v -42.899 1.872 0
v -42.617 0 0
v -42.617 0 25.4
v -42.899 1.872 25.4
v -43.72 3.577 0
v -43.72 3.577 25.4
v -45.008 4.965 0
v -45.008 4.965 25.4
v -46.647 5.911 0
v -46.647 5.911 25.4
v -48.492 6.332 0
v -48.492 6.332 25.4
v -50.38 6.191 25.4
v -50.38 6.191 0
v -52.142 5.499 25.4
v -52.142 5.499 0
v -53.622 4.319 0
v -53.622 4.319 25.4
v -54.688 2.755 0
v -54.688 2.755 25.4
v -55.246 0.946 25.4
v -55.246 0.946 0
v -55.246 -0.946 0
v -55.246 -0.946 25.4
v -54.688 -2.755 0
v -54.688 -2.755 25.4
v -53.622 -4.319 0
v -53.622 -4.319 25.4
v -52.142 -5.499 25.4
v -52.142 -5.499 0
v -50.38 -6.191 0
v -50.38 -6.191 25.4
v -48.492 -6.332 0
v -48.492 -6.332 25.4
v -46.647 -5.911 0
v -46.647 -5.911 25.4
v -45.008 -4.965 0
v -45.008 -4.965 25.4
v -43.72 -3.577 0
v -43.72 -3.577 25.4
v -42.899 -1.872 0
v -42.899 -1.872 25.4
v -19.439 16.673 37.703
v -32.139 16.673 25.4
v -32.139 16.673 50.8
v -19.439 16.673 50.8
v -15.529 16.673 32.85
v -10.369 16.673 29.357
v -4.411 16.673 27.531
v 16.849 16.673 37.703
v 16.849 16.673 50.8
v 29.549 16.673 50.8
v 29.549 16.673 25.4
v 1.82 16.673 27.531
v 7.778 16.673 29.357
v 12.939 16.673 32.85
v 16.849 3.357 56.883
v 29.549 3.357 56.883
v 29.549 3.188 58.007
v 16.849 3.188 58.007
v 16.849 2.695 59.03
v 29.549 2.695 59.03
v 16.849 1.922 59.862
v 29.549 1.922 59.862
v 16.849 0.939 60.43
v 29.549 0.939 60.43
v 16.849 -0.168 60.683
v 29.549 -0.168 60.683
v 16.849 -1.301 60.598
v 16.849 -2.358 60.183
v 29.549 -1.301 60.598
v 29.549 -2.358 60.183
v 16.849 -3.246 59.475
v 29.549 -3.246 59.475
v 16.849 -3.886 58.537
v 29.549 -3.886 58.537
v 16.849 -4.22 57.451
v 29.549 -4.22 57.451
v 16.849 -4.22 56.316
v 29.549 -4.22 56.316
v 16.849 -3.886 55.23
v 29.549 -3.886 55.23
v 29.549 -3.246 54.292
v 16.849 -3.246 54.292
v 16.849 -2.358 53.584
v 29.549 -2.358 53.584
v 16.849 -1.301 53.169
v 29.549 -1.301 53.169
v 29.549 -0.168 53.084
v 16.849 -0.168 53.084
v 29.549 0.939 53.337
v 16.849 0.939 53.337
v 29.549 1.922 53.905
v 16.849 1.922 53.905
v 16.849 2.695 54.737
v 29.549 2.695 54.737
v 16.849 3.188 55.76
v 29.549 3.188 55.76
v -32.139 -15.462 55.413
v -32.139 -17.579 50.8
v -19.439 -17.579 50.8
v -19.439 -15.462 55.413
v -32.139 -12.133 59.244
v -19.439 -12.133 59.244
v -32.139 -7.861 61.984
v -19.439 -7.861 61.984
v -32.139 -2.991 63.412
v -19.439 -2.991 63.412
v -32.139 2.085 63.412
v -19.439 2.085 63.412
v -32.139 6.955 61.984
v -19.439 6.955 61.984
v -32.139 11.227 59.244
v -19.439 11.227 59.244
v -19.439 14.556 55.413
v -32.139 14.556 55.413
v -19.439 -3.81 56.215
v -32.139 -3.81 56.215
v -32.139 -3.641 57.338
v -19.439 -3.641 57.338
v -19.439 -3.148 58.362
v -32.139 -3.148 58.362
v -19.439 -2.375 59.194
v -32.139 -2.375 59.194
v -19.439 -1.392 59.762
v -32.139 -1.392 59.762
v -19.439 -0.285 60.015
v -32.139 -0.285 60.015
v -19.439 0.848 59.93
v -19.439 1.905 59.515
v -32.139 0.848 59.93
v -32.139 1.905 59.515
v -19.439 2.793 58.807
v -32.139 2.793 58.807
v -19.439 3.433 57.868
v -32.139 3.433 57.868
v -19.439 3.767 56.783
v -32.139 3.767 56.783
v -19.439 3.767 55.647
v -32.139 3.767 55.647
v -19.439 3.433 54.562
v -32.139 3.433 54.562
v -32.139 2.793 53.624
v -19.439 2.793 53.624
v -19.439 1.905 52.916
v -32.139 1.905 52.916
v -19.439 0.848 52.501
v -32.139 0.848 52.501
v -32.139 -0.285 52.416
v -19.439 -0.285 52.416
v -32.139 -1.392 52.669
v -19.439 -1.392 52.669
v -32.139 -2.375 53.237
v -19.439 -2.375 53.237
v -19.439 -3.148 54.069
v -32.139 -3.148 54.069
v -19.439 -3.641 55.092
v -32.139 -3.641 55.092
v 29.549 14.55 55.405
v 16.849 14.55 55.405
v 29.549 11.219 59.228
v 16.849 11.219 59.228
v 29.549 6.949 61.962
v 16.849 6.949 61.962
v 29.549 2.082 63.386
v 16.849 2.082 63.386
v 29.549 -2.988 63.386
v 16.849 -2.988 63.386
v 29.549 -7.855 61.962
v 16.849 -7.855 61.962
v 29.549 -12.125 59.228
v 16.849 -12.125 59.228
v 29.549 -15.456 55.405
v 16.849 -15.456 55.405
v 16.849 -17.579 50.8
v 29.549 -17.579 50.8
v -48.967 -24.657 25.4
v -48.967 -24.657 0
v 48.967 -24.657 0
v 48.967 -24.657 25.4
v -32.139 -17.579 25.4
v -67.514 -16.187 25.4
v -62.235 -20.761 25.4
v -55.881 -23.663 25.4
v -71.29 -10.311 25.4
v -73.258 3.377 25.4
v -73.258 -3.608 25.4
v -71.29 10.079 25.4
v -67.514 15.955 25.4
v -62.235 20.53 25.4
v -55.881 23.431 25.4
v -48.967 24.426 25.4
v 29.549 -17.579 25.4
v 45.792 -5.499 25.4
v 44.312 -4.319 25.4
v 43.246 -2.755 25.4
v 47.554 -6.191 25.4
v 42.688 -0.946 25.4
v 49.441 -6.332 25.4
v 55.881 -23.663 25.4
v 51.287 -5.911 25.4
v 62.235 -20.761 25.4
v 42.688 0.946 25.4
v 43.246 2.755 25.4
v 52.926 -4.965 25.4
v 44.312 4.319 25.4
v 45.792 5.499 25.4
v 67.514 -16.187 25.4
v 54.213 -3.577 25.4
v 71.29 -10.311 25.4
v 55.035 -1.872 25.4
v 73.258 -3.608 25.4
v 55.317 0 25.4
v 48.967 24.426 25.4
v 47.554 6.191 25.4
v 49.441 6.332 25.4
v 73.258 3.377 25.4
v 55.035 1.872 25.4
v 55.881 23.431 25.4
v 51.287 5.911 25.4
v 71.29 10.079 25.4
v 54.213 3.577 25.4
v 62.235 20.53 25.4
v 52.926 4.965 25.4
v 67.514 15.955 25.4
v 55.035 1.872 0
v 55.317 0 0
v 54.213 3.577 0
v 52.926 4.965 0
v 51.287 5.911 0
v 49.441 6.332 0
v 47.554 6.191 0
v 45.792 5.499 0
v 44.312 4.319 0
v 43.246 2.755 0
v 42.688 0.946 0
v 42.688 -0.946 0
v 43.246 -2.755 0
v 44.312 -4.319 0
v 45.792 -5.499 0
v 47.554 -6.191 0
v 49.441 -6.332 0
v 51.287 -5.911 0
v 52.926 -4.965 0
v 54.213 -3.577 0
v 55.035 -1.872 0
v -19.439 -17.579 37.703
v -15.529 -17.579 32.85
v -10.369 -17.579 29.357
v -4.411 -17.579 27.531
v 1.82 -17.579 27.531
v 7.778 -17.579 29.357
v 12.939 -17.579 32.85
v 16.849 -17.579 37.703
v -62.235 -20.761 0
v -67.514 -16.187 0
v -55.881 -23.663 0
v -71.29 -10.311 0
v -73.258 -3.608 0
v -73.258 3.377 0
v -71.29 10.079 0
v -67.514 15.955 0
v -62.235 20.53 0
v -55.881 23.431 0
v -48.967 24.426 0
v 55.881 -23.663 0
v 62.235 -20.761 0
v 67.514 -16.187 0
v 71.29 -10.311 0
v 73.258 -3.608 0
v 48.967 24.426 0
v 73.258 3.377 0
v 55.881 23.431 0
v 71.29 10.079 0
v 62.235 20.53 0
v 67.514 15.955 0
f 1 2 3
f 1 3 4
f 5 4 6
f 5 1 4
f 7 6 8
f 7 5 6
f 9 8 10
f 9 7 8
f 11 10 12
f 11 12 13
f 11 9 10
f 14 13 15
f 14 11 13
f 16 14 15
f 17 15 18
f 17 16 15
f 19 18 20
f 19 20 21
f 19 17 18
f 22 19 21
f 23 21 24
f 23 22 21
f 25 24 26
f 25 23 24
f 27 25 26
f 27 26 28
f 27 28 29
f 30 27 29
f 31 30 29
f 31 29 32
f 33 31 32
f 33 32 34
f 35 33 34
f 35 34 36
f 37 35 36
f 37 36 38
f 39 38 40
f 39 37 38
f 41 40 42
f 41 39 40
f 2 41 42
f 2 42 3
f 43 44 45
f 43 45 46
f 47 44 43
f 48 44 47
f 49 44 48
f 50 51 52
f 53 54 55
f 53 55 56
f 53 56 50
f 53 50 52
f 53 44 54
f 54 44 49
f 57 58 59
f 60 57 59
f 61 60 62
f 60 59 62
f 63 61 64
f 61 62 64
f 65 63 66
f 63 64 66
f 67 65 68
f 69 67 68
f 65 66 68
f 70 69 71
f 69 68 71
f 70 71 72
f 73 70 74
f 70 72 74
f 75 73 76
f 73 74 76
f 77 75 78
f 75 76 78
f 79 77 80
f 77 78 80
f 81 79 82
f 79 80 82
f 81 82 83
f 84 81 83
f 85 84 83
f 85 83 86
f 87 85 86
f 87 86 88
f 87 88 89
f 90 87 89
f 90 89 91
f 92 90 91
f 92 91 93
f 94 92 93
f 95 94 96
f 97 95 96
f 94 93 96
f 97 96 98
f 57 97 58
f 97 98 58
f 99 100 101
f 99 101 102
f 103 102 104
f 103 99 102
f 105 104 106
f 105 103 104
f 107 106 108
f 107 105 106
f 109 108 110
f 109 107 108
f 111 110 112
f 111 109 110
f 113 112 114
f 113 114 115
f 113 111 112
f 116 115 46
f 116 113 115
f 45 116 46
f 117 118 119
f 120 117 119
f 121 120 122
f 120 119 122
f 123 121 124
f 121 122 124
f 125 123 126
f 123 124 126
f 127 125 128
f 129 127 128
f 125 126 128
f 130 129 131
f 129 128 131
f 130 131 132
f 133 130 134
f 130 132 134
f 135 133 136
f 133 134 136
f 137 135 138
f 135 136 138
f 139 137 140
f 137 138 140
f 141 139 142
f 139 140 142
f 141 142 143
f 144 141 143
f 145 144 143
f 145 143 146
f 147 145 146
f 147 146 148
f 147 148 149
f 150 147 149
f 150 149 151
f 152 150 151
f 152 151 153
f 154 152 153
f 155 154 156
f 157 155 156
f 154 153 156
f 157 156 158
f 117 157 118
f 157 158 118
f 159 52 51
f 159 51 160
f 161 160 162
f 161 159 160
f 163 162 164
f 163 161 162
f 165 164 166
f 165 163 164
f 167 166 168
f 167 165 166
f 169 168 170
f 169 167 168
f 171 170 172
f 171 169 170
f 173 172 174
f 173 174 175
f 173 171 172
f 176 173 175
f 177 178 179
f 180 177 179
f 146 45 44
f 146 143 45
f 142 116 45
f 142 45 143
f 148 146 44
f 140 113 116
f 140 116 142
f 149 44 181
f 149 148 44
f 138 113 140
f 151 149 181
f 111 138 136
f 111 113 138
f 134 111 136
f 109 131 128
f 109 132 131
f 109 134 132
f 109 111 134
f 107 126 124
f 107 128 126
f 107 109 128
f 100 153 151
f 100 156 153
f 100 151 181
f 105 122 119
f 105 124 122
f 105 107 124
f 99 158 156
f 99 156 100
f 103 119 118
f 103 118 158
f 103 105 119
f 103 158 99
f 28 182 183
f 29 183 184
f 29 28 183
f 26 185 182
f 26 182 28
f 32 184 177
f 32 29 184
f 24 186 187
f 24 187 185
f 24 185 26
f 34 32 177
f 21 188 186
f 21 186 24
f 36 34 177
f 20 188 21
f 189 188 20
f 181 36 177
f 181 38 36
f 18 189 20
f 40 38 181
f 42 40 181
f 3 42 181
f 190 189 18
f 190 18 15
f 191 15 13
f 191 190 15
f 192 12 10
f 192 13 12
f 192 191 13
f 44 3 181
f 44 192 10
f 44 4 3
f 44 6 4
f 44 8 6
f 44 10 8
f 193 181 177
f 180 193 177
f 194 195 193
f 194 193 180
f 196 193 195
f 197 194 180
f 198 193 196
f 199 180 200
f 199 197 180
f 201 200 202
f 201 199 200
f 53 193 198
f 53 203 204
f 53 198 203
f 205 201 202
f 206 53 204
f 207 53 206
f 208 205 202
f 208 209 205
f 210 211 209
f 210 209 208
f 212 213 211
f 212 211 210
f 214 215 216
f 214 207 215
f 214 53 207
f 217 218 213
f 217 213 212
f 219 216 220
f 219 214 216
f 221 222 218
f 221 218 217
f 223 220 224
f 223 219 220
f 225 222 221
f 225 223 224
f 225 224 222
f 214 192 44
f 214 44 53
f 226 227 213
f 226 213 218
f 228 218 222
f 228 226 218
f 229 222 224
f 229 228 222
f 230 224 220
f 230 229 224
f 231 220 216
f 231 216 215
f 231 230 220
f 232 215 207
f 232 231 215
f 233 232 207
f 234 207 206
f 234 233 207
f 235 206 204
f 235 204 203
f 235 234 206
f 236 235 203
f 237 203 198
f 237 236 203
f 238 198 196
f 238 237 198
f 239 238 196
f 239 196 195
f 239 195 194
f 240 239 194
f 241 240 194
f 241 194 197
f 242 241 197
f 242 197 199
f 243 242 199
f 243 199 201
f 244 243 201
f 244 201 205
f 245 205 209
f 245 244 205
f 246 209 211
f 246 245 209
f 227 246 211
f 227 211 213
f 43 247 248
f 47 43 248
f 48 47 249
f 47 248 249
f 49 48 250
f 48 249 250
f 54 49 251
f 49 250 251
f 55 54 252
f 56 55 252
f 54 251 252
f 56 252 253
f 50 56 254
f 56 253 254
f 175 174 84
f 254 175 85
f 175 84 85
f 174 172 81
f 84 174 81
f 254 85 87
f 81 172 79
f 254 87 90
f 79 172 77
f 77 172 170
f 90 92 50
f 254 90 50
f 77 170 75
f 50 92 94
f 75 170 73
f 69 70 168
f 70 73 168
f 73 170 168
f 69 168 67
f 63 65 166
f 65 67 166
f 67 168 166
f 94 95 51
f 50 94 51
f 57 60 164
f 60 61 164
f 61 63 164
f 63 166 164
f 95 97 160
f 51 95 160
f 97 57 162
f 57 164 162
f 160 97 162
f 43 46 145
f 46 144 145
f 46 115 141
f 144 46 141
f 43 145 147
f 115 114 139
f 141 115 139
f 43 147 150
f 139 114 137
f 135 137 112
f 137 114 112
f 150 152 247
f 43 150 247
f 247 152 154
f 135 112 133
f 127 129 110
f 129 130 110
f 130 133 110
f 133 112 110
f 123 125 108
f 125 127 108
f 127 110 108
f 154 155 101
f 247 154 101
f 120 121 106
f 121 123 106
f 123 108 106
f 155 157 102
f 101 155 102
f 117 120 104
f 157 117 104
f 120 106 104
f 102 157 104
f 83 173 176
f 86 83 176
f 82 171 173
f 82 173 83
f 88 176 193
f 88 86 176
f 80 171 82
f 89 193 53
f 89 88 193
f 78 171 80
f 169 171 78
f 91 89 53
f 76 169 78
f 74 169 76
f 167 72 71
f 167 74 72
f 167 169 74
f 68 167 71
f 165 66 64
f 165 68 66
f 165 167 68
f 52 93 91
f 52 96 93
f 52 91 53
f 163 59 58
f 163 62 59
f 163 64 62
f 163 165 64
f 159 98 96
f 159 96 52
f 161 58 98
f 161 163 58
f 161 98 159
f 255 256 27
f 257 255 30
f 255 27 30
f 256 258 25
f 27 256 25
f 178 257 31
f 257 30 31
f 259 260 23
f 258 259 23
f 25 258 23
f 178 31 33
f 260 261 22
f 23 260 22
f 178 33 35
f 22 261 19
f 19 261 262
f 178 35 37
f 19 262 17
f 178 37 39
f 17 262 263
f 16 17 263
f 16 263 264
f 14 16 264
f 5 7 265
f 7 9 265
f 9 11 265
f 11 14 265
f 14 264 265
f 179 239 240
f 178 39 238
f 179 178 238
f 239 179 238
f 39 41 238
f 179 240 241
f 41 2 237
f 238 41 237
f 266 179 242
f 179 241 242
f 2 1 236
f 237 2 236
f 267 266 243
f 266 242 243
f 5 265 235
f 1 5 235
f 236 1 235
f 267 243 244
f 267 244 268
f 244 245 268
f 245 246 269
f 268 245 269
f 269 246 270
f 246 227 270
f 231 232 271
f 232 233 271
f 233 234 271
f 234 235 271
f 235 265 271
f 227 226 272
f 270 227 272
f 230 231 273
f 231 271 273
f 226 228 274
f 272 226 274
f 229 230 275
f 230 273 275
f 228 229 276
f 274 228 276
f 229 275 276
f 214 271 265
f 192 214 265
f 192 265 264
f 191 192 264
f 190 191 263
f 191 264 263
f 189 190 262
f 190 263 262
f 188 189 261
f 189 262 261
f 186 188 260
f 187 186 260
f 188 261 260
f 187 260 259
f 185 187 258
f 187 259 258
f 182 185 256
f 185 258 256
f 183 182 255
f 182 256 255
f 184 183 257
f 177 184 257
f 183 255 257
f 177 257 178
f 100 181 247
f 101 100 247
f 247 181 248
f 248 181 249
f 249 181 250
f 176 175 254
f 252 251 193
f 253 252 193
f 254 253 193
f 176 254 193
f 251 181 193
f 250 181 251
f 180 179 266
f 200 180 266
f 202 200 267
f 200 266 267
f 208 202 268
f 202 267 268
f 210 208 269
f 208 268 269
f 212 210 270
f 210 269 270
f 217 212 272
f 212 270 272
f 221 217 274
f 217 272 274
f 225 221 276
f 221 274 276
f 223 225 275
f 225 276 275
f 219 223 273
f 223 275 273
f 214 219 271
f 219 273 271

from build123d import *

# Parameters (mm, degrees)
F0_R     = 6.35
F1_DEPTH = 25.4
F2_W     = 61.6878718138
F2_H     = 34.2521034181
F3_DEPTH = 25.4
F5_DEPTH = 36.322
F6_R     = 3.81
F7_DEPTH = 12.7
F8_R     = 3.81
F9_DEPTH = 12.7


with BuildPart() as f1:
    # F0 (on Top) → F1 (new body)
    with BuildSketch(Plane.XY):
        with BuildLine():
            Line((48.9668589424, 24.4255484226), (-48.9668589424, 24.4255484226))
            ThreePointArc((-48.9668589424, 24.4255484226), (-73.5081685676, -0.1157612025), (-48.9668589424, -24.6570708277))
            Line((-48.9668589424, -24.6570708277), (48.9668589424, -24.6570708277))
            ThreePointArc((48.9668589424, -24.6570708277), (73.5081685676, -0.1157612025), (48.9668589424, 24.4255484226))
        make_face()
        with Locations((-48.9668589424, 0)):
            Circle(F0_R, mode=Mode.SUBTRACT)
        with Locations((48.9668589424, 0)):
            Circle(F0_R, mode=Mode.SUBTRACT)
    extrude(amount=F1_DEPTH)

    # F2 (on face) → F3 (join)
    with BuildSketch(Plane.XY.offset(25.4)):
        with Locations((-1.2954026461, -0.45302324)):
            Rectangle(F2_W, F2_H)
    extrude(amount=F3_DEPTH)

    # F4 (on face) → F5 (cut)
    with BuildSketch(Plane.XZ.offset(17.579074949)):
        with BuildLine():
            Line((16.8485332608, 50.8), (-19.439338553, 50.8))
            Line((-19.439338553, 50.8), (-19.439338553, 37.702742964))
            ThreePointArc((-19.439338553, 37.702742964), (-1.2954026461, 27.2985841975), (16.8485332608, 37.702742964))
            Line((16.8485332608, 37.702742964), (16.8485332608, 50.8))
        make_face()
    extrude(amount=-F5_DEPTH, mode=Mode.SUBTRACT)

    # F6 (on face) → F7 (join)
    with BuildSketch(Plane(origin=(-32.139338553, 0, 0), x_dir=(0, -1, 0), z_dir=(-1, 0, 0))):
        with BuildLine():
            Line((-16.6730284691, 50.8), (17.579074949, 50.8))
            ThreePointArc((17.579074949, 50.8), (0.45302324, 63.5928311153), (-16.6730284691, 50.8))
        make_face()
        with Locations((0, 56.2153086066)):
            Circle(F6_R, mode=Mode.SUBTRACT)
    extrude(amount=-F7_DEPTH)

    # F8 (on face) → F9 (join)
    with BuildSketch(Plane.YZ.offset(29.5485332608)):
        with BuildLine():
            ThreePointArc((16.6730284691, 50.8), (-0.45302324, 63.5665881357), (-17.579074949, 50.8))
            Line((-17.579074949, 50.8), (16.6730284691, 50.8))
        make_face()
        with Locations((-0.45302324, 56.8834878504)):
            Circle(F8_R, mode=Mode.SUBTRACT)
    extrude(amount=-F9_DEPTH)


solid = f1.part
